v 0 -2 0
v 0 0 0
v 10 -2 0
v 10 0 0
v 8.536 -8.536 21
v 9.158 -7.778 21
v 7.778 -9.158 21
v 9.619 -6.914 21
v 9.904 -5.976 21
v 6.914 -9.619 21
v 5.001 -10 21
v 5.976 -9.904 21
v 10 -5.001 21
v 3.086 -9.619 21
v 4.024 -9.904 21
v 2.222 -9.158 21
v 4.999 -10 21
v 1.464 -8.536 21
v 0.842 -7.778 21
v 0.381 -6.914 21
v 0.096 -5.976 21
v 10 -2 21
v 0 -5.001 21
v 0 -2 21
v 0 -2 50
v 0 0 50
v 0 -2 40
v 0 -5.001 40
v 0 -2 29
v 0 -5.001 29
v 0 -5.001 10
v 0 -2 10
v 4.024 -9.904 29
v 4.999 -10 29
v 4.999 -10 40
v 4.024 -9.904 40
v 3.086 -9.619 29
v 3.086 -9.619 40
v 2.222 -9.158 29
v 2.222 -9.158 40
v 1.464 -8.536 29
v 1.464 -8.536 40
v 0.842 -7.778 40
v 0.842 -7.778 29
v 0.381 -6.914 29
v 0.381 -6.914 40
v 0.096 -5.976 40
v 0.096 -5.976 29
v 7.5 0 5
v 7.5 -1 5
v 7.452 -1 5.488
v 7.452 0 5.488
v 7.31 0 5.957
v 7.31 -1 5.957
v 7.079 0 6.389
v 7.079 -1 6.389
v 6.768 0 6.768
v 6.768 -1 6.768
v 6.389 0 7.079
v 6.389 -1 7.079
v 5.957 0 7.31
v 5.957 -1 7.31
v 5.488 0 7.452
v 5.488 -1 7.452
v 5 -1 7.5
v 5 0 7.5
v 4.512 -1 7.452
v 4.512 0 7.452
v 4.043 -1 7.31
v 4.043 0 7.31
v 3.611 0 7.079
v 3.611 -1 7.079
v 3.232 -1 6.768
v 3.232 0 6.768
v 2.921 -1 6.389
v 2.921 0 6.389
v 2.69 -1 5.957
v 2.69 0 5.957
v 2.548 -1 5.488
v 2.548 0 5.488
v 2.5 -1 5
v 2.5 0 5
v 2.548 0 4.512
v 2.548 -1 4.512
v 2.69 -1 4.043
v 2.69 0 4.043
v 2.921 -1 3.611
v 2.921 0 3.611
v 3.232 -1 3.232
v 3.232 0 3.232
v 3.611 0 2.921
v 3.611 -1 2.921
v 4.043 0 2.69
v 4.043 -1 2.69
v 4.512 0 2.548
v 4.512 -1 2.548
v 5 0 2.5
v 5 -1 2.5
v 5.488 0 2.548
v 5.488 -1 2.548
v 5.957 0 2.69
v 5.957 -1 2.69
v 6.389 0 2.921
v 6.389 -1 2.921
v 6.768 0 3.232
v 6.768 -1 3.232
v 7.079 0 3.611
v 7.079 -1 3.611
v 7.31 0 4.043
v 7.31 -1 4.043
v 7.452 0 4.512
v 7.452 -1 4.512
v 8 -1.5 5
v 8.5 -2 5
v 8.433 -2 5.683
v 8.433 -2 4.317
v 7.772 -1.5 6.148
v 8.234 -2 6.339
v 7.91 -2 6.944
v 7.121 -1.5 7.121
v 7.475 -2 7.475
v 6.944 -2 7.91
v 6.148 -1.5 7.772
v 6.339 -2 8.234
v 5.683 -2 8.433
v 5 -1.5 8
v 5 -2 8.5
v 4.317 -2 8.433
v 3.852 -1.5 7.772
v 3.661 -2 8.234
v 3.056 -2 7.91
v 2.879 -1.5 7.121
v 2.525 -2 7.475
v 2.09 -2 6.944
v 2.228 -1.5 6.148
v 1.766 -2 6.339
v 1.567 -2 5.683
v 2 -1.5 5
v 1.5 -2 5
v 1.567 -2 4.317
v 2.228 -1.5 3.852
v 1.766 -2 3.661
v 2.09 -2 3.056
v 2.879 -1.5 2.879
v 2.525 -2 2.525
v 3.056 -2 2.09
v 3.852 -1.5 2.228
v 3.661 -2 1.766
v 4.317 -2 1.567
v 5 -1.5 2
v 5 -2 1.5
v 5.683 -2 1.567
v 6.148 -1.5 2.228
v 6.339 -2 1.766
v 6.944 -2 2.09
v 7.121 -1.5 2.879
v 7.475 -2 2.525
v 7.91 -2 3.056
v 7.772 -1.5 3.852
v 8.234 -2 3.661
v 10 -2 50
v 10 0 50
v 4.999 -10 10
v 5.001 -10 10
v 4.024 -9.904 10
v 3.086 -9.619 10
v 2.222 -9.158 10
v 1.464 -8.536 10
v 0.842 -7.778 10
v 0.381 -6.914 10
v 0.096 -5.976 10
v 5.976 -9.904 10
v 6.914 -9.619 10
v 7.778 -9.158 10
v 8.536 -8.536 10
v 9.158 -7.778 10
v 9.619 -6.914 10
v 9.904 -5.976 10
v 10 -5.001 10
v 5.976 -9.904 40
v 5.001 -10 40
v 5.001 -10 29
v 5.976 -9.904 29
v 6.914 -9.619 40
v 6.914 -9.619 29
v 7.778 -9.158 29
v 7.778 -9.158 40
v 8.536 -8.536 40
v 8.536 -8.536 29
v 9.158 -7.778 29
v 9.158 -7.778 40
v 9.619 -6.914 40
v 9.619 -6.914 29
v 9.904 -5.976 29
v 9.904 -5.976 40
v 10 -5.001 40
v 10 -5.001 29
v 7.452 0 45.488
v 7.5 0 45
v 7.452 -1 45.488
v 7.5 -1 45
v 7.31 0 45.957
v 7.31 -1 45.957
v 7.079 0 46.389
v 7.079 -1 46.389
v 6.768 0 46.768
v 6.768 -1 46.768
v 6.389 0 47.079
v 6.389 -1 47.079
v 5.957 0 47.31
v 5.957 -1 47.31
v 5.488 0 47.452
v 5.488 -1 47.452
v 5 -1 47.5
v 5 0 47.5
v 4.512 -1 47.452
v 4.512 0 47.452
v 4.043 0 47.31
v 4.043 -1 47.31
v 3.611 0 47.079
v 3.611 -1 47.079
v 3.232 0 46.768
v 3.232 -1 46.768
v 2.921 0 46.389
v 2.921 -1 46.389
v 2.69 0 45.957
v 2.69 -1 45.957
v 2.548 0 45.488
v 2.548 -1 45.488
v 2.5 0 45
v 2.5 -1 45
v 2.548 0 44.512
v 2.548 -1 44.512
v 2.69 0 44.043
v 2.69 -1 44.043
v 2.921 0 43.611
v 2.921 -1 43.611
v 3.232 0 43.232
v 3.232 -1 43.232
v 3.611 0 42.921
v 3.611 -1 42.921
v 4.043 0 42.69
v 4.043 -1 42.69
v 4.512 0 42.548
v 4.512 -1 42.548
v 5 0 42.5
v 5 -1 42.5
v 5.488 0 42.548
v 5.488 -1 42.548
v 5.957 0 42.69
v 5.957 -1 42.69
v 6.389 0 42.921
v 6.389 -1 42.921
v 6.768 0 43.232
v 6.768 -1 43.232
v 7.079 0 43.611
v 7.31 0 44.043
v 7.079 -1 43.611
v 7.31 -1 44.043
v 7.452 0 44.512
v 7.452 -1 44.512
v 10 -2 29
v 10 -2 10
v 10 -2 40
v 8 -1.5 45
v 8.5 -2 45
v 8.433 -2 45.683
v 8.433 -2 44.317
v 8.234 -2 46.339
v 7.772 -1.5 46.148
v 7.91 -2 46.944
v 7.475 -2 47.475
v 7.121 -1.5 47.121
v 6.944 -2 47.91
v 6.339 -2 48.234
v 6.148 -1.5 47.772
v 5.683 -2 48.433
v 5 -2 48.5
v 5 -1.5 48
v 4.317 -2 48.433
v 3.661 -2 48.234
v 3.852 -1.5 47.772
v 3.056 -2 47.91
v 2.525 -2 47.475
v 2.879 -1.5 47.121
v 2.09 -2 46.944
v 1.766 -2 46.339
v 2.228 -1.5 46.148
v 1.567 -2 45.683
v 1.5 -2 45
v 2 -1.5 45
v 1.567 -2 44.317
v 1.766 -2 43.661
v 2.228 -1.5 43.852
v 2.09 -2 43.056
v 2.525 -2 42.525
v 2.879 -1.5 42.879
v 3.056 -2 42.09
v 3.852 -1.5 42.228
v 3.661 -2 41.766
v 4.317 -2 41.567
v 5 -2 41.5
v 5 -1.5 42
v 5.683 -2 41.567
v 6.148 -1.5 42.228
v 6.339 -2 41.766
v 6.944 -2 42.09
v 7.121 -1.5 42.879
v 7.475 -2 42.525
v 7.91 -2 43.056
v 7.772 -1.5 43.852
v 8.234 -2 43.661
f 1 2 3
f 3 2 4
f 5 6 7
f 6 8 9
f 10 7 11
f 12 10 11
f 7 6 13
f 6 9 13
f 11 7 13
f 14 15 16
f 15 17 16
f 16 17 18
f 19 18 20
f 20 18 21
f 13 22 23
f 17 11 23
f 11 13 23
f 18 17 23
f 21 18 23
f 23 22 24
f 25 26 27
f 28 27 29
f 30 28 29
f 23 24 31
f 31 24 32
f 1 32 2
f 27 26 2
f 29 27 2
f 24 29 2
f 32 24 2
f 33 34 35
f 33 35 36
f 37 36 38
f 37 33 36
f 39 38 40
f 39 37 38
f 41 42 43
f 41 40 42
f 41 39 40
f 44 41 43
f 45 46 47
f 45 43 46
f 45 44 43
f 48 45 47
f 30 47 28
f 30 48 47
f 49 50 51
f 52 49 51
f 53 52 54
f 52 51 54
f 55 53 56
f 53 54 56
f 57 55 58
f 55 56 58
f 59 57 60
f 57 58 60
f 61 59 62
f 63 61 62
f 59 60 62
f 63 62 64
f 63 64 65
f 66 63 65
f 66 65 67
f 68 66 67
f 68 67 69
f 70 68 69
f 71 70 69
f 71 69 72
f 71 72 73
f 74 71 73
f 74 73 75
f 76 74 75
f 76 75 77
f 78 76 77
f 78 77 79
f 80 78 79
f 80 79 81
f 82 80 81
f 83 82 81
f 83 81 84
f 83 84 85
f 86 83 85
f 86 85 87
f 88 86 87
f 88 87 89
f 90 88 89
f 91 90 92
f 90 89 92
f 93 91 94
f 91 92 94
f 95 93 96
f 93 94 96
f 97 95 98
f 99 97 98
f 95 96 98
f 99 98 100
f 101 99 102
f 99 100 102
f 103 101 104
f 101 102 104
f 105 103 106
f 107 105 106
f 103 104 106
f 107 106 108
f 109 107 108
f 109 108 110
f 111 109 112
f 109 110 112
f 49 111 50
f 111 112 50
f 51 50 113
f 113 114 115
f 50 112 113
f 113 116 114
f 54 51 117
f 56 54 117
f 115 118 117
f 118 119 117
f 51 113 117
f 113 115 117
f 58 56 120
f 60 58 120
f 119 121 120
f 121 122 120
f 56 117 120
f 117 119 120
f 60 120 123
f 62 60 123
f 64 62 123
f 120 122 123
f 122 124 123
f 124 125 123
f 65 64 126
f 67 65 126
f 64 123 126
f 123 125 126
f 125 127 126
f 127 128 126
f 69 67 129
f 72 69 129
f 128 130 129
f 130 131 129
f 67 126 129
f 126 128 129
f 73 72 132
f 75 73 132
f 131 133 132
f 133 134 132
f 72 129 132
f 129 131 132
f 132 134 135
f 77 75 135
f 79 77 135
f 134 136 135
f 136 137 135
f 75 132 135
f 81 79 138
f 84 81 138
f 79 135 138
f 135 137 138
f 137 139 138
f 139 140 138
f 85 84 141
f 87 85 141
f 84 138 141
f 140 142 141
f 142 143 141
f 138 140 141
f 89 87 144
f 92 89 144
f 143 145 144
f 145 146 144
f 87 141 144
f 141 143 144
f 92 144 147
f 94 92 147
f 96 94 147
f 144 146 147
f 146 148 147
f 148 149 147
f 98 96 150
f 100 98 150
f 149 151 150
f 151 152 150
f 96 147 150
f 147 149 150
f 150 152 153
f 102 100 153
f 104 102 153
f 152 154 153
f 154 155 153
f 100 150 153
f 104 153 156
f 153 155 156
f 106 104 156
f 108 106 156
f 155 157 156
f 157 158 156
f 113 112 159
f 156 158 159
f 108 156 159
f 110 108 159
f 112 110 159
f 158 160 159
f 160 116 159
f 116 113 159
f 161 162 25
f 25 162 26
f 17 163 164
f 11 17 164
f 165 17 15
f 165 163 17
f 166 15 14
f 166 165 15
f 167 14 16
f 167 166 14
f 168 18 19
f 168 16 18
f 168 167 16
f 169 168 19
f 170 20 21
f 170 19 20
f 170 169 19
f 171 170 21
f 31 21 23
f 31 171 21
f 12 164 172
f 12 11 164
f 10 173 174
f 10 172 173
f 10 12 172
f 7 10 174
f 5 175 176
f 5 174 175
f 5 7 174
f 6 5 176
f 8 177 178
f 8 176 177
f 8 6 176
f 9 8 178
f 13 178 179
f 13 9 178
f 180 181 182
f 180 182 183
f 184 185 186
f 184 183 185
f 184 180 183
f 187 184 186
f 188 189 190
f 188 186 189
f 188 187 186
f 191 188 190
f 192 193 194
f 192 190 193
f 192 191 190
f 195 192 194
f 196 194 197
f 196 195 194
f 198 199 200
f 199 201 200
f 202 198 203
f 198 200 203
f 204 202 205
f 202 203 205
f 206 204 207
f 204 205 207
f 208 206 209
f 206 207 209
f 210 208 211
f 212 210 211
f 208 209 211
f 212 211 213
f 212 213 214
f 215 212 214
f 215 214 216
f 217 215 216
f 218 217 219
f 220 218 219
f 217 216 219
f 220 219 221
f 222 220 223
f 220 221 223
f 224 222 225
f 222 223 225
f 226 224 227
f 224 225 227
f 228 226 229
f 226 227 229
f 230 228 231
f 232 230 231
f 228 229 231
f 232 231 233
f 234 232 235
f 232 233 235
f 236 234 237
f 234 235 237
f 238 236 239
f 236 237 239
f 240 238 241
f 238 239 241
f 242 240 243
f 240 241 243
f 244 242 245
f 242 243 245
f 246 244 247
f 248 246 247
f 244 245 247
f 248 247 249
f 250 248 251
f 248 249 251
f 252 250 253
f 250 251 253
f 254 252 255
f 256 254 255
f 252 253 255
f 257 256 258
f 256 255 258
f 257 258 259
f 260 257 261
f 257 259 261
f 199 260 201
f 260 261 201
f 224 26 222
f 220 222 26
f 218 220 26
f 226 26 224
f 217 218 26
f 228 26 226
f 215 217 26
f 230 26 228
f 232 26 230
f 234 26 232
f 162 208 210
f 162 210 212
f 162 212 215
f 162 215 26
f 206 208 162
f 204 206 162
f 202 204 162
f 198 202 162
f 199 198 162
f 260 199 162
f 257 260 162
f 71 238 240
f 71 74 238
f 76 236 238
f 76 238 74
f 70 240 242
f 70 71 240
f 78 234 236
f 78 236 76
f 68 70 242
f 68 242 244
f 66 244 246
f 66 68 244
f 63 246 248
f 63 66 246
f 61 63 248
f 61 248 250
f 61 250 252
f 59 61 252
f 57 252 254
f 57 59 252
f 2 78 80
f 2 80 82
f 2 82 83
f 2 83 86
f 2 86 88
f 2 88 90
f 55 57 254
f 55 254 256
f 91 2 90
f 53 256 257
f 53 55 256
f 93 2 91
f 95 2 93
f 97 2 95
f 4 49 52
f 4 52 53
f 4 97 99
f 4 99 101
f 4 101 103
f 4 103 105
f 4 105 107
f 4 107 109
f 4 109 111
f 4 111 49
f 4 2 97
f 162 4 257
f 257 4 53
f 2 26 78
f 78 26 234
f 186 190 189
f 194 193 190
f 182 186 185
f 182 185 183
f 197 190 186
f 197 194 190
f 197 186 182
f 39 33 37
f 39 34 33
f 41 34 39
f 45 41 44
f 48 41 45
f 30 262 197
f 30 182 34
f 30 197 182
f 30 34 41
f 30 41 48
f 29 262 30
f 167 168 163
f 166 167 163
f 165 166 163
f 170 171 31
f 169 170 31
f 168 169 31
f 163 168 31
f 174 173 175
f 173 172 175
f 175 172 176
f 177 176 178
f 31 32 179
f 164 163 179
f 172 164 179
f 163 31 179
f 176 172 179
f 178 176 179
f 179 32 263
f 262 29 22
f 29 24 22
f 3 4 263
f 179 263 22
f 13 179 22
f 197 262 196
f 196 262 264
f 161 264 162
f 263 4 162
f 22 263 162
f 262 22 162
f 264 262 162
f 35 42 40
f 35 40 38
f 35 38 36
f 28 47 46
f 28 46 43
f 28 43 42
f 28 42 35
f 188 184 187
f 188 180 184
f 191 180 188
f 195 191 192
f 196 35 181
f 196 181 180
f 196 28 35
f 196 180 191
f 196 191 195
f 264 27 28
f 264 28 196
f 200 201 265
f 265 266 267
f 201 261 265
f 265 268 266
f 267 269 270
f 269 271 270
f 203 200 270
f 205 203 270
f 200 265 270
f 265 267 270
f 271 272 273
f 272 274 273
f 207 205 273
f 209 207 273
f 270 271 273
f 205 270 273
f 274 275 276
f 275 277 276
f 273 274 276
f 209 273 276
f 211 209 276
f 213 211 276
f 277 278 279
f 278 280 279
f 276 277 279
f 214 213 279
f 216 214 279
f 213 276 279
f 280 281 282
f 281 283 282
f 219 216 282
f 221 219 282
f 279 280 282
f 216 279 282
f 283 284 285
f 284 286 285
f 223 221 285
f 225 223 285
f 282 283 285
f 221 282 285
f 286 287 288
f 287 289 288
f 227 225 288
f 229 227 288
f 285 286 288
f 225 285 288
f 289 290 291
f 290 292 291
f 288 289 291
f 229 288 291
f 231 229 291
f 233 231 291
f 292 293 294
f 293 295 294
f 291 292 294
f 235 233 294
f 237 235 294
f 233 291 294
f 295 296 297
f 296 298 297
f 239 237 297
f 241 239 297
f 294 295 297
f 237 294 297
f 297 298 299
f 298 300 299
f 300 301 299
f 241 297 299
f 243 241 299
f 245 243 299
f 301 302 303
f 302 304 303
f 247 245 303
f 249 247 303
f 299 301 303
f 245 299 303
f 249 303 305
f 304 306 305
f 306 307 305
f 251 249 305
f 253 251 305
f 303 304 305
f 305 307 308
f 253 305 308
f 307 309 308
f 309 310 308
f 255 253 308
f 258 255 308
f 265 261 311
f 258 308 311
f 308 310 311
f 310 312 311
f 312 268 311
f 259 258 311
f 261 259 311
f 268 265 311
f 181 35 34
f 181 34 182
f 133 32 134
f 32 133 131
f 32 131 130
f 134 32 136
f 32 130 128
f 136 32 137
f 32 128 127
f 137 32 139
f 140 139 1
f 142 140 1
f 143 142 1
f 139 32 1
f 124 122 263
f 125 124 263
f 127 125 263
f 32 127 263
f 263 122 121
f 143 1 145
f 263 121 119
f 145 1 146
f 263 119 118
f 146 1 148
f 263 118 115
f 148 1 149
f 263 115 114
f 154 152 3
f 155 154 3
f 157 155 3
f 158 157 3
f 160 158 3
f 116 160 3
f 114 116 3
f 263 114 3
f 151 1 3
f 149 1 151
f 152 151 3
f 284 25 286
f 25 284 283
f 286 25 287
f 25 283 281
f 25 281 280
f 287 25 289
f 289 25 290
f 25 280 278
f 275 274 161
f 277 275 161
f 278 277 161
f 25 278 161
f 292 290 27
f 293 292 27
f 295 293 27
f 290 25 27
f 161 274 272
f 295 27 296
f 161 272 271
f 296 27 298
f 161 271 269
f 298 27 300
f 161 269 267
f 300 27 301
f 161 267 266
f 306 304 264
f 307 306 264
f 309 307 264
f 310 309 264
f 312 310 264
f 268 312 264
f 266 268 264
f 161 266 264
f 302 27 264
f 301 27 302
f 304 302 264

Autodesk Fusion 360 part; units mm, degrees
sketch "Sketch1" plane through (0, 0, 0) normal (0, 1, 0) x (1, 0, 0)
  line L0 (0, 0) -> (10, 0)
  line L1 (10, 0) -> (10, -50)
  line L2 (10, -50) -> (0, -50)
  line L3 (0, -50) -> (0, 0)
  dimension "d1" = 10
  dimension "d2" = 50
extrude "Extrude1" add sketch "Sketch1" against normal blind 2
sketch "Sketch2" plane through (0, -2, 0) normal (0, -1, 0) x (1, 0, 0)
  line L0 (10, 50) -> (0, 50)
  line L1 (0, 50) -> (0, 0)
  line L2 (0, 0) -> (10, 0)
  line L3 (10, 0) -> (10, 50)
  line L4 (0, 40) -> (10, 40)
  line L5 (10, 40) -> (10, 29)
  line L6 (10, 29) -> (0, 29)
  line L7 (0, 29) -> (0, 40)
  line L8 (0, 10) -> (10, 10)
  line L9 (10, 10) -> (10, 21)
  line L10 (10, 21) -> (0, 21)
  line L11 (0, 21) -> (0, 10)
  circle A0 centre (5, 45) radius 2.5
  circle A1 centre (5, 5) radius 2.5
  dimension "d5" = 5
  dimension "d6" = 5
  dimension "d7" = 5
  dimension "d8" = 5
  dimension "d9" = 11
  dimension "d10" = 11
  dimension "d11" = 10
  dimension "d12" = 10
  dimension "d13" = 8
  dimension "d14" = 5
  dimension "d15" = 5
  dimension "d16" = 5
extrude "Extrude2" add sketch "Sketch2" along normal blind 8 contours L1 L3 L4 L5 L6 L7 | L1 L3 L8 L9 L10 L11
extrude "Extrude3" cut sketch "Sketch2" against normal blind 2 contours A0 | A1
chamfer "Chamfer1" distance 1 angle 45 2 edges at (2.6692, -2, 45.904) (2.6692, -2, 5.904)
fillet "Fillet1" radius 5 4 edges at (0, -10, 34.5) (0, -10, 15.5) (10, -10, 34.5) (10, -10, 15.5)
